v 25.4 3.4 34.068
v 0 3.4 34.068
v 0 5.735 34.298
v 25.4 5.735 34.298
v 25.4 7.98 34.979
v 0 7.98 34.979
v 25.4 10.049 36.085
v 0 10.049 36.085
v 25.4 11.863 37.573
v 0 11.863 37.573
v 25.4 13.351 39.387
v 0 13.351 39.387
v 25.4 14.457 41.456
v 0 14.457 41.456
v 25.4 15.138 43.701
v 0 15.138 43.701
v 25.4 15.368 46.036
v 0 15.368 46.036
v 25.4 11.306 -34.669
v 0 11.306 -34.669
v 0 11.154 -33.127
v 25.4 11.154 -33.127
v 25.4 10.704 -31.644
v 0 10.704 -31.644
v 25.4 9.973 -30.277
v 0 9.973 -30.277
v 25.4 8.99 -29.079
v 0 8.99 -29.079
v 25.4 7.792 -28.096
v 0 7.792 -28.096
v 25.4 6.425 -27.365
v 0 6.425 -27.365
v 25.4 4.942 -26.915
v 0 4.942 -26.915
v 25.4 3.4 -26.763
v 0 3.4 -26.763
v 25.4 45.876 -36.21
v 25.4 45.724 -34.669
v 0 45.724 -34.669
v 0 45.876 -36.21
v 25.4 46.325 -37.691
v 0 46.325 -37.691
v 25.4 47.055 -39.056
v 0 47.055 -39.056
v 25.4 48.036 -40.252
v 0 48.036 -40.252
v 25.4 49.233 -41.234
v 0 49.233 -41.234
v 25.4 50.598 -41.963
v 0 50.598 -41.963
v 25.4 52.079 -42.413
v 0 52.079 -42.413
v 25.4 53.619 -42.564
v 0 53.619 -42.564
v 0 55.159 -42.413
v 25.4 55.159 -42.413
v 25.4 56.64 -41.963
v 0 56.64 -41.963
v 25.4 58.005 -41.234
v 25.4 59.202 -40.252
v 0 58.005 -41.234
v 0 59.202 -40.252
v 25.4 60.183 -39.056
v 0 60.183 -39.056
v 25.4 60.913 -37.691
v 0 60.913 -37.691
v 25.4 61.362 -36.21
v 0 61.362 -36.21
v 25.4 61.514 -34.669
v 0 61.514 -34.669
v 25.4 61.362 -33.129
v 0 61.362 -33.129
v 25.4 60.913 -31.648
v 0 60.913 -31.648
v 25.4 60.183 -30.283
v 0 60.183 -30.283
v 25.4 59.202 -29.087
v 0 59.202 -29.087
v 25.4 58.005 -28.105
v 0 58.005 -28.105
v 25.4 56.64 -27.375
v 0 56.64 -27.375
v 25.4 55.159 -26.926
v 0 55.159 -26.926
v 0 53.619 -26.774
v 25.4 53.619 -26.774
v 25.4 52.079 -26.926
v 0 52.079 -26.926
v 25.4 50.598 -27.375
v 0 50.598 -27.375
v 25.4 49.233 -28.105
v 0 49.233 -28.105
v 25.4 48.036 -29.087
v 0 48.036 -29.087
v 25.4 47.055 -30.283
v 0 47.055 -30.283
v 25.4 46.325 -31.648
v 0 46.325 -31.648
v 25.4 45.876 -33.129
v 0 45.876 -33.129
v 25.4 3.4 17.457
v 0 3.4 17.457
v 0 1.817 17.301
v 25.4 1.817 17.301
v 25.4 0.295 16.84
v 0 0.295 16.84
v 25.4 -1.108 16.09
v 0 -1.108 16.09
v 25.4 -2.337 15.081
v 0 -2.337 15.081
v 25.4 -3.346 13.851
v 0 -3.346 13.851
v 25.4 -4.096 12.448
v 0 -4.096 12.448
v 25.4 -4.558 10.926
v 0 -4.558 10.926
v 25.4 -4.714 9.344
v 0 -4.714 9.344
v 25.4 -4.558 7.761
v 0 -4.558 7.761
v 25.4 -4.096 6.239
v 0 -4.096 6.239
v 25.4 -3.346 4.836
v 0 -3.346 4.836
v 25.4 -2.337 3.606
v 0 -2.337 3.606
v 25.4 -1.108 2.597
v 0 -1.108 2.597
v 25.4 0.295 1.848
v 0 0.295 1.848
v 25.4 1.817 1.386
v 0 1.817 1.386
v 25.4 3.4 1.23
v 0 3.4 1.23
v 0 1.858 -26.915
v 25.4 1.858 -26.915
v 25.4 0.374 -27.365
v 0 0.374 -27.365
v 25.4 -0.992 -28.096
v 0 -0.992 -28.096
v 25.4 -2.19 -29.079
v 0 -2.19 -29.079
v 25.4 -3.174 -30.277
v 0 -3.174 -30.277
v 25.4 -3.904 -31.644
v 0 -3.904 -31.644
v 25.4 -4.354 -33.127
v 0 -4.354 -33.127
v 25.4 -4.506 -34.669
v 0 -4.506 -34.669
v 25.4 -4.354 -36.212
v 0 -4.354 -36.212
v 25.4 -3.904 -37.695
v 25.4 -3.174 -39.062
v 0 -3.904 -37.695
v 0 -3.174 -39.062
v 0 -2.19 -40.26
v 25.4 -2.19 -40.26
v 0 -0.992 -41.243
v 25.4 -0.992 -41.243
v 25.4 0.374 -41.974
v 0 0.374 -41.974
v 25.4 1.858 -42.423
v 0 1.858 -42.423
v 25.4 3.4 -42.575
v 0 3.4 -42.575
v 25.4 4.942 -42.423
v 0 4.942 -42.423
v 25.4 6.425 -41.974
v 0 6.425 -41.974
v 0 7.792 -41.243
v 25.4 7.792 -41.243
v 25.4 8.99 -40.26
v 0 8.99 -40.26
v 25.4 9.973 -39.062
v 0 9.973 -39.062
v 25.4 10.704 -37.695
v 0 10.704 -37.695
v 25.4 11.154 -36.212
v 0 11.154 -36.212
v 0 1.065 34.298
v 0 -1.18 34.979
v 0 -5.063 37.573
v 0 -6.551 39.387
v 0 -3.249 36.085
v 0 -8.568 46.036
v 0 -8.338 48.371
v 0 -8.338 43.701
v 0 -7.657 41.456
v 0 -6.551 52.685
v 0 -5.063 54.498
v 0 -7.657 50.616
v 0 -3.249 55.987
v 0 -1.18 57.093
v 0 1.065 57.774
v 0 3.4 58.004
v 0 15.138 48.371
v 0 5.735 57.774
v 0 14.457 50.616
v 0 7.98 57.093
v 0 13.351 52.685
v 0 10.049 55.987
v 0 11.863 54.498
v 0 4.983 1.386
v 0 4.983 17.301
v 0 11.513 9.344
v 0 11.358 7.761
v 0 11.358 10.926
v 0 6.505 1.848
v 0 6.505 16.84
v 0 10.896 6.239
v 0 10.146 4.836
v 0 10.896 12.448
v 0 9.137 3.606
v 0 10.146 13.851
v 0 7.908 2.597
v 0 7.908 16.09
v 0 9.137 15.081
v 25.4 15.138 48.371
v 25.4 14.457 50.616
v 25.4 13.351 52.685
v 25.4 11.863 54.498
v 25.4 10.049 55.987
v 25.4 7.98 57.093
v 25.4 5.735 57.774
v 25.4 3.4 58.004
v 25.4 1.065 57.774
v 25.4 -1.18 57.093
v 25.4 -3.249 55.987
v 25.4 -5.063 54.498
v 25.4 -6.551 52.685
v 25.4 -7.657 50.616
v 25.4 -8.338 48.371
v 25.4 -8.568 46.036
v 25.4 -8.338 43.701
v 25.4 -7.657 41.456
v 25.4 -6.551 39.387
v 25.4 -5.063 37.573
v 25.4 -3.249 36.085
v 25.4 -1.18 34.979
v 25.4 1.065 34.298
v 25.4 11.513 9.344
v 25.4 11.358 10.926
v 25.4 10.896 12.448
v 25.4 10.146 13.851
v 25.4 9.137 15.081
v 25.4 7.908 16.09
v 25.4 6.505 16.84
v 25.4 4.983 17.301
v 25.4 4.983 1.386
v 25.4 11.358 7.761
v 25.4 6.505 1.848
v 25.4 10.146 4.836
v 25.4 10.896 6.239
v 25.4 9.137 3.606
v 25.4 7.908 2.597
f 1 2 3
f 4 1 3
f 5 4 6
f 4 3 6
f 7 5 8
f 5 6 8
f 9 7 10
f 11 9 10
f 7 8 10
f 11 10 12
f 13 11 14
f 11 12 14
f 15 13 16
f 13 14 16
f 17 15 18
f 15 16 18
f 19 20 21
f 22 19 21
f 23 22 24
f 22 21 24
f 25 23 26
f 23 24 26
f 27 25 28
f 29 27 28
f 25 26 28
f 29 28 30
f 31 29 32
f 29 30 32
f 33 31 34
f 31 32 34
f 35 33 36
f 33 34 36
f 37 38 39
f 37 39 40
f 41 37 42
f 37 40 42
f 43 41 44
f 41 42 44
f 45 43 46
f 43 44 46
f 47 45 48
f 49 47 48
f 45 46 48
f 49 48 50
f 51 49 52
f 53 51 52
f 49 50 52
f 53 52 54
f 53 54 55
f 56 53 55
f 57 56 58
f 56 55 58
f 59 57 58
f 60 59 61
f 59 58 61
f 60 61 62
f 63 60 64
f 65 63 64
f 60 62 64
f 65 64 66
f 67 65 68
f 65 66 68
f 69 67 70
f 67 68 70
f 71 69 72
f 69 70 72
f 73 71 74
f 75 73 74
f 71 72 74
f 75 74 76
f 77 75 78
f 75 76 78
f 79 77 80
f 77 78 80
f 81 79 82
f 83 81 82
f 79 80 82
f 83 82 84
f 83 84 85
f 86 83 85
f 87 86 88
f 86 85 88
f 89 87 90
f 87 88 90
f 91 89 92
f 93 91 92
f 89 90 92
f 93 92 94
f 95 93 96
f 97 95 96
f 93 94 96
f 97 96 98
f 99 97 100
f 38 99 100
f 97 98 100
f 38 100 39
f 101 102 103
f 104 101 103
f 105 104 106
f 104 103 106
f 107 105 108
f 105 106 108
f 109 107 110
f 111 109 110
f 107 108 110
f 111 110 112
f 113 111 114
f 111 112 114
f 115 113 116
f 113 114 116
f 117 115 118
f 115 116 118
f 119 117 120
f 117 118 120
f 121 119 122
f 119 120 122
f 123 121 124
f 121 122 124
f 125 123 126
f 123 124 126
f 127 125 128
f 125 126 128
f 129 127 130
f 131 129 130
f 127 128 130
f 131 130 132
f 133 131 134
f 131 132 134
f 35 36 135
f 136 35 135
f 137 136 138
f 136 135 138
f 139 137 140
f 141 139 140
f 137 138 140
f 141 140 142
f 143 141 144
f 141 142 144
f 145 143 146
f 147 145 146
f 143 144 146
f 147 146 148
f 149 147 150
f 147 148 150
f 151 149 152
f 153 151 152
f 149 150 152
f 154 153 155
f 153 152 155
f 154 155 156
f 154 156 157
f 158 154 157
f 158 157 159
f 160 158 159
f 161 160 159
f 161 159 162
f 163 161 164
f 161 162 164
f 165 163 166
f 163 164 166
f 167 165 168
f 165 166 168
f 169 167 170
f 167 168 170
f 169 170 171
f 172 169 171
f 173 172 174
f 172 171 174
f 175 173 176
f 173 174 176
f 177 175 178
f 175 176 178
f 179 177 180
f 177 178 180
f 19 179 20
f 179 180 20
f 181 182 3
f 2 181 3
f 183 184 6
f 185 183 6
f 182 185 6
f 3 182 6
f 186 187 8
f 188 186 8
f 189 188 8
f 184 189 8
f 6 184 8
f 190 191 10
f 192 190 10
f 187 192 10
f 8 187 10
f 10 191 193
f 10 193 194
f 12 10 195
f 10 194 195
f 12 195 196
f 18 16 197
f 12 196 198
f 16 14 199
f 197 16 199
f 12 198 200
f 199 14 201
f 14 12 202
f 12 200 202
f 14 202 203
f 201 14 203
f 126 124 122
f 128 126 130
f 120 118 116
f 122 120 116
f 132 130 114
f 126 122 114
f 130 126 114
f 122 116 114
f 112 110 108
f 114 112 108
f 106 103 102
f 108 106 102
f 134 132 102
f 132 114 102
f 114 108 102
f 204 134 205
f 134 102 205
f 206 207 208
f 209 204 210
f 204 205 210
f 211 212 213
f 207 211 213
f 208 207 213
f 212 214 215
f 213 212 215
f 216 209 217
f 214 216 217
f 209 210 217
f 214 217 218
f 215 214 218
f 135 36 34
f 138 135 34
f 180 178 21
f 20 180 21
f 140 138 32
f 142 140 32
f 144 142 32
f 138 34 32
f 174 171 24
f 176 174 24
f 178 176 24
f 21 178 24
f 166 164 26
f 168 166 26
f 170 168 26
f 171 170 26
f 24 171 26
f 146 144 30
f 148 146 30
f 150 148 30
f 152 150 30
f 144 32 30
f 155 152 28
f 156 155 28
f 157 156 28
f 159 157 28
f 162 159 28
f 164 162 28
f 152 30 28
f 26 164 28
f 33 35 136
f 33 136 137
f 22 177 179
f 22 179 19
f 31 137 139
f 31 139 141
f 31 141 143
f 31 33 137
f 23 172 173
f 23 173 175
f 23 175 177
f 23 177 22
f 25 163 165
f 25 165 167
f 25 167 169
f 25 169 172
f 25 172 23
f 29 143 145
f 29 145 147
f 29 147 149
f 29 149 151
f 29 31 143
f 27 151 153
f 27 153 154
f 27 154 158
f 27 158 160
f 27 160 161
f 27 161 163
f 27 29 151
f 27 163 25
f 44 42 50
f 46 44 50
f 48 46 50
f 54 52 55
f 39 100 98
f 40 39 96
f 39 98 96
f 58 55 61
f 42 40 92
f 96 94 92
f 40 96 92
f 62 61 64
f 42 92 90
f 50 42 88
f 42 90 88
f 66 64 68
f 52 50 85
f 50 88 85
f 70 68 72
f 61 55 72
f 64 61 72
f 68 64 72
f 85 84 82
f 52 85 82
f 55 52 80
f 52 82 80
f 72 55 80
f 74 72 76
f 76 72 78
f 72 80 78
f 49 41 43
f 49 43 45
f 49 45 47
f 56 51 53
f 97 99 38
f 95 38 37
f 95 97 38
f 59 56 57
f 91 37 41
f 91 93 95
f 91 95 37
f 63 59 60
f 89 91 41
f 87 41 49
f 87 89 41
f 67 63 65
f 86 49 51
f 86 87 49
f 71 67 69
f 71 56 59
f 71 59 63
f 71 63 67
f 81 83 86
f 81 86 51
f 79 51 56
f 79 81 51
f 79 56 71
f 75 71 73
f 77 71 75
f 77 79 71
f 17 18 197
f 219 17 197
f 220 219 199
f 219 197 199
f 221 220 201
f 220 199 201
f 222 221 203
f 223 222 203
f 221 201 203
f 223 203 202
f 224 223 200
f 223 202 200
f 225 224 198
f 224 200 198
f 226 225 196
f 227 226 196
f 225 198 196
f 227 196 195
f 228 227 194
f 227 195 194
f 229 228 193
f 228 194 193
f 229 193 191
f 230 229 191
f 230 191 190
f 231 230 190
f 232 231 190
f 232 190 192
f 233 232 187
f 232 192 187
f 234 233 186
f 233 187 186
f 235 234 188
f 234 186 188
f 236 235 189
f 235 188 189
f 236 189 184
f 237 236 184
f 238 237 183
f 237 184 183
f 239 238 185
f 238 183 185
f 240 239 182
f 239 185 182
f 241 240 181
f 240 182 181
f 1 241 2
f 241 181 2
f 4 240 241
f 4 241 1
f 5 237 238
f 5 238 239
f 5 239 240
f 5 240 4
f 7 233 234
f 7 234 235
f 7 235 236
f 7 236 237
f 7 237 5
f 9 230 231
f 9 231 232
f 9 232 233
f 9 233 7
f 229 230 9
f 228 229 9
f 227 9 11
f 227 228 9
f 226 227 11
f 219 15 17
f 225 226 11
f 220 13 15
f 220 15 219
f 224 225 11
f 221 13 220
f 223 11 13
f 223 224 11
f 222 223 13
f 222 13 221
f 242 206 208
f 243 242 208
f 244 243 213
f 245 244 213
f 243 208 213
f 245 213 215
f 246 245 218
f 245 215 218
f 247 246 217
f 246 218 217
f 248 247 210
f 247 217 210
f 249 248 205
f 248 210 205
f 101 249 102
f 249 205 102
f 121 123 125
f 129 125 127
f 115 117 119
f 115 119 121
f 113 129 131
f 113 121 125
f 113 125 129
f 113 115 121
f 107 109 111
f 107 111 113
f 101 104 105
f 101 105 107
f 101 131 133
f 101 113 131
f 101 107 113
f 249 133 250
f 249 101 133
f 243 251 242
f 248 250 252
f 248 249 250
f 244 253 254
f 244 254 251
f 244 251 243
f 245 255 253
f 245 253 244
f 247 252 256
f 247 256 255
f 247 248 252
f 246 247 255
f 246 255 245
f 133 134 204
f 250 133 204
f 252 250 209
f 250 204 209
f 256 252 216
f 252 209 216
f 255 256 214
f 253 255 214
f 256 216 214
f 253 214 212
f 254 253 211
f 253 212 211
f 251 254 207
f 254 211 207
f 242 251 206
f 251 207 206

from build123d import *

# Parameters (mm, degrees)
F1_DEPTH = 25.4


with BuildPart() as f1:
    # F0 (on Right) → F1 (new body)
    with BuildSketch(Plane.YZ):
        with BuildLine():
            ThreePointArc((61.513891, -34.669332), (53.618963, -26.774404), (45.724035, -34.669332))
            ThreePointArc((45.724035, -34.669332), (53.618963, -42.56426), (61.513891, -34.669332))
        make_face()
        with BuildLine():
            ThreePointArc((11.305887, -34.669332), (8.990278, -29.078958), (3.399904, -26.763349))
            Line((3.399904, -26.763349), (3.399904, -34.669332))
            Line((3.399904, -34.669332), (11.305887, -34.669332))
        make_face()
        with BuildLine():
            Line((3.399904, -34.669332), (3.399904, -26.763349))
            ThreePointArc((3.399904, -26.763349), (-2.190471, -40.259706), (11.305887, -34.669332))
            Line((11.305887, -34.669332), (3.399904, -34.669332))
        make_face()
        with BuildLine():
            ThreePointArc((11.513463, 9.343571), (9.137056, 15.080724), (3.399904, 17.45713))
            Line((3.399904, 17.45713), (3.399904, 1.230012))
            ThreePointArc((3.399904, 1.230012), (9.137056, 3.606418), (11.513463, 9.343571))
        make_face()
        with BuildLine():
            Line((3.399904, 1.230012), (3.399904, 17.45713))
            ThreePointArc((3.399904, 17.45713), (-4.713656, 9.343571), (3.399904, 1.230012))
        make_face()
        with BuildLine():
            ThreePointArc((15.367944, 46.035774), (-5.062779, 54.498456), (3.399904, 34.067734))
            ThreePointArc((3.399904, 34.067734), (11.862586, 37.573092), (15.367944, 46.035774))
        make_face()
    extrude(amount=F1_DEPTH)


solid = f1.part
